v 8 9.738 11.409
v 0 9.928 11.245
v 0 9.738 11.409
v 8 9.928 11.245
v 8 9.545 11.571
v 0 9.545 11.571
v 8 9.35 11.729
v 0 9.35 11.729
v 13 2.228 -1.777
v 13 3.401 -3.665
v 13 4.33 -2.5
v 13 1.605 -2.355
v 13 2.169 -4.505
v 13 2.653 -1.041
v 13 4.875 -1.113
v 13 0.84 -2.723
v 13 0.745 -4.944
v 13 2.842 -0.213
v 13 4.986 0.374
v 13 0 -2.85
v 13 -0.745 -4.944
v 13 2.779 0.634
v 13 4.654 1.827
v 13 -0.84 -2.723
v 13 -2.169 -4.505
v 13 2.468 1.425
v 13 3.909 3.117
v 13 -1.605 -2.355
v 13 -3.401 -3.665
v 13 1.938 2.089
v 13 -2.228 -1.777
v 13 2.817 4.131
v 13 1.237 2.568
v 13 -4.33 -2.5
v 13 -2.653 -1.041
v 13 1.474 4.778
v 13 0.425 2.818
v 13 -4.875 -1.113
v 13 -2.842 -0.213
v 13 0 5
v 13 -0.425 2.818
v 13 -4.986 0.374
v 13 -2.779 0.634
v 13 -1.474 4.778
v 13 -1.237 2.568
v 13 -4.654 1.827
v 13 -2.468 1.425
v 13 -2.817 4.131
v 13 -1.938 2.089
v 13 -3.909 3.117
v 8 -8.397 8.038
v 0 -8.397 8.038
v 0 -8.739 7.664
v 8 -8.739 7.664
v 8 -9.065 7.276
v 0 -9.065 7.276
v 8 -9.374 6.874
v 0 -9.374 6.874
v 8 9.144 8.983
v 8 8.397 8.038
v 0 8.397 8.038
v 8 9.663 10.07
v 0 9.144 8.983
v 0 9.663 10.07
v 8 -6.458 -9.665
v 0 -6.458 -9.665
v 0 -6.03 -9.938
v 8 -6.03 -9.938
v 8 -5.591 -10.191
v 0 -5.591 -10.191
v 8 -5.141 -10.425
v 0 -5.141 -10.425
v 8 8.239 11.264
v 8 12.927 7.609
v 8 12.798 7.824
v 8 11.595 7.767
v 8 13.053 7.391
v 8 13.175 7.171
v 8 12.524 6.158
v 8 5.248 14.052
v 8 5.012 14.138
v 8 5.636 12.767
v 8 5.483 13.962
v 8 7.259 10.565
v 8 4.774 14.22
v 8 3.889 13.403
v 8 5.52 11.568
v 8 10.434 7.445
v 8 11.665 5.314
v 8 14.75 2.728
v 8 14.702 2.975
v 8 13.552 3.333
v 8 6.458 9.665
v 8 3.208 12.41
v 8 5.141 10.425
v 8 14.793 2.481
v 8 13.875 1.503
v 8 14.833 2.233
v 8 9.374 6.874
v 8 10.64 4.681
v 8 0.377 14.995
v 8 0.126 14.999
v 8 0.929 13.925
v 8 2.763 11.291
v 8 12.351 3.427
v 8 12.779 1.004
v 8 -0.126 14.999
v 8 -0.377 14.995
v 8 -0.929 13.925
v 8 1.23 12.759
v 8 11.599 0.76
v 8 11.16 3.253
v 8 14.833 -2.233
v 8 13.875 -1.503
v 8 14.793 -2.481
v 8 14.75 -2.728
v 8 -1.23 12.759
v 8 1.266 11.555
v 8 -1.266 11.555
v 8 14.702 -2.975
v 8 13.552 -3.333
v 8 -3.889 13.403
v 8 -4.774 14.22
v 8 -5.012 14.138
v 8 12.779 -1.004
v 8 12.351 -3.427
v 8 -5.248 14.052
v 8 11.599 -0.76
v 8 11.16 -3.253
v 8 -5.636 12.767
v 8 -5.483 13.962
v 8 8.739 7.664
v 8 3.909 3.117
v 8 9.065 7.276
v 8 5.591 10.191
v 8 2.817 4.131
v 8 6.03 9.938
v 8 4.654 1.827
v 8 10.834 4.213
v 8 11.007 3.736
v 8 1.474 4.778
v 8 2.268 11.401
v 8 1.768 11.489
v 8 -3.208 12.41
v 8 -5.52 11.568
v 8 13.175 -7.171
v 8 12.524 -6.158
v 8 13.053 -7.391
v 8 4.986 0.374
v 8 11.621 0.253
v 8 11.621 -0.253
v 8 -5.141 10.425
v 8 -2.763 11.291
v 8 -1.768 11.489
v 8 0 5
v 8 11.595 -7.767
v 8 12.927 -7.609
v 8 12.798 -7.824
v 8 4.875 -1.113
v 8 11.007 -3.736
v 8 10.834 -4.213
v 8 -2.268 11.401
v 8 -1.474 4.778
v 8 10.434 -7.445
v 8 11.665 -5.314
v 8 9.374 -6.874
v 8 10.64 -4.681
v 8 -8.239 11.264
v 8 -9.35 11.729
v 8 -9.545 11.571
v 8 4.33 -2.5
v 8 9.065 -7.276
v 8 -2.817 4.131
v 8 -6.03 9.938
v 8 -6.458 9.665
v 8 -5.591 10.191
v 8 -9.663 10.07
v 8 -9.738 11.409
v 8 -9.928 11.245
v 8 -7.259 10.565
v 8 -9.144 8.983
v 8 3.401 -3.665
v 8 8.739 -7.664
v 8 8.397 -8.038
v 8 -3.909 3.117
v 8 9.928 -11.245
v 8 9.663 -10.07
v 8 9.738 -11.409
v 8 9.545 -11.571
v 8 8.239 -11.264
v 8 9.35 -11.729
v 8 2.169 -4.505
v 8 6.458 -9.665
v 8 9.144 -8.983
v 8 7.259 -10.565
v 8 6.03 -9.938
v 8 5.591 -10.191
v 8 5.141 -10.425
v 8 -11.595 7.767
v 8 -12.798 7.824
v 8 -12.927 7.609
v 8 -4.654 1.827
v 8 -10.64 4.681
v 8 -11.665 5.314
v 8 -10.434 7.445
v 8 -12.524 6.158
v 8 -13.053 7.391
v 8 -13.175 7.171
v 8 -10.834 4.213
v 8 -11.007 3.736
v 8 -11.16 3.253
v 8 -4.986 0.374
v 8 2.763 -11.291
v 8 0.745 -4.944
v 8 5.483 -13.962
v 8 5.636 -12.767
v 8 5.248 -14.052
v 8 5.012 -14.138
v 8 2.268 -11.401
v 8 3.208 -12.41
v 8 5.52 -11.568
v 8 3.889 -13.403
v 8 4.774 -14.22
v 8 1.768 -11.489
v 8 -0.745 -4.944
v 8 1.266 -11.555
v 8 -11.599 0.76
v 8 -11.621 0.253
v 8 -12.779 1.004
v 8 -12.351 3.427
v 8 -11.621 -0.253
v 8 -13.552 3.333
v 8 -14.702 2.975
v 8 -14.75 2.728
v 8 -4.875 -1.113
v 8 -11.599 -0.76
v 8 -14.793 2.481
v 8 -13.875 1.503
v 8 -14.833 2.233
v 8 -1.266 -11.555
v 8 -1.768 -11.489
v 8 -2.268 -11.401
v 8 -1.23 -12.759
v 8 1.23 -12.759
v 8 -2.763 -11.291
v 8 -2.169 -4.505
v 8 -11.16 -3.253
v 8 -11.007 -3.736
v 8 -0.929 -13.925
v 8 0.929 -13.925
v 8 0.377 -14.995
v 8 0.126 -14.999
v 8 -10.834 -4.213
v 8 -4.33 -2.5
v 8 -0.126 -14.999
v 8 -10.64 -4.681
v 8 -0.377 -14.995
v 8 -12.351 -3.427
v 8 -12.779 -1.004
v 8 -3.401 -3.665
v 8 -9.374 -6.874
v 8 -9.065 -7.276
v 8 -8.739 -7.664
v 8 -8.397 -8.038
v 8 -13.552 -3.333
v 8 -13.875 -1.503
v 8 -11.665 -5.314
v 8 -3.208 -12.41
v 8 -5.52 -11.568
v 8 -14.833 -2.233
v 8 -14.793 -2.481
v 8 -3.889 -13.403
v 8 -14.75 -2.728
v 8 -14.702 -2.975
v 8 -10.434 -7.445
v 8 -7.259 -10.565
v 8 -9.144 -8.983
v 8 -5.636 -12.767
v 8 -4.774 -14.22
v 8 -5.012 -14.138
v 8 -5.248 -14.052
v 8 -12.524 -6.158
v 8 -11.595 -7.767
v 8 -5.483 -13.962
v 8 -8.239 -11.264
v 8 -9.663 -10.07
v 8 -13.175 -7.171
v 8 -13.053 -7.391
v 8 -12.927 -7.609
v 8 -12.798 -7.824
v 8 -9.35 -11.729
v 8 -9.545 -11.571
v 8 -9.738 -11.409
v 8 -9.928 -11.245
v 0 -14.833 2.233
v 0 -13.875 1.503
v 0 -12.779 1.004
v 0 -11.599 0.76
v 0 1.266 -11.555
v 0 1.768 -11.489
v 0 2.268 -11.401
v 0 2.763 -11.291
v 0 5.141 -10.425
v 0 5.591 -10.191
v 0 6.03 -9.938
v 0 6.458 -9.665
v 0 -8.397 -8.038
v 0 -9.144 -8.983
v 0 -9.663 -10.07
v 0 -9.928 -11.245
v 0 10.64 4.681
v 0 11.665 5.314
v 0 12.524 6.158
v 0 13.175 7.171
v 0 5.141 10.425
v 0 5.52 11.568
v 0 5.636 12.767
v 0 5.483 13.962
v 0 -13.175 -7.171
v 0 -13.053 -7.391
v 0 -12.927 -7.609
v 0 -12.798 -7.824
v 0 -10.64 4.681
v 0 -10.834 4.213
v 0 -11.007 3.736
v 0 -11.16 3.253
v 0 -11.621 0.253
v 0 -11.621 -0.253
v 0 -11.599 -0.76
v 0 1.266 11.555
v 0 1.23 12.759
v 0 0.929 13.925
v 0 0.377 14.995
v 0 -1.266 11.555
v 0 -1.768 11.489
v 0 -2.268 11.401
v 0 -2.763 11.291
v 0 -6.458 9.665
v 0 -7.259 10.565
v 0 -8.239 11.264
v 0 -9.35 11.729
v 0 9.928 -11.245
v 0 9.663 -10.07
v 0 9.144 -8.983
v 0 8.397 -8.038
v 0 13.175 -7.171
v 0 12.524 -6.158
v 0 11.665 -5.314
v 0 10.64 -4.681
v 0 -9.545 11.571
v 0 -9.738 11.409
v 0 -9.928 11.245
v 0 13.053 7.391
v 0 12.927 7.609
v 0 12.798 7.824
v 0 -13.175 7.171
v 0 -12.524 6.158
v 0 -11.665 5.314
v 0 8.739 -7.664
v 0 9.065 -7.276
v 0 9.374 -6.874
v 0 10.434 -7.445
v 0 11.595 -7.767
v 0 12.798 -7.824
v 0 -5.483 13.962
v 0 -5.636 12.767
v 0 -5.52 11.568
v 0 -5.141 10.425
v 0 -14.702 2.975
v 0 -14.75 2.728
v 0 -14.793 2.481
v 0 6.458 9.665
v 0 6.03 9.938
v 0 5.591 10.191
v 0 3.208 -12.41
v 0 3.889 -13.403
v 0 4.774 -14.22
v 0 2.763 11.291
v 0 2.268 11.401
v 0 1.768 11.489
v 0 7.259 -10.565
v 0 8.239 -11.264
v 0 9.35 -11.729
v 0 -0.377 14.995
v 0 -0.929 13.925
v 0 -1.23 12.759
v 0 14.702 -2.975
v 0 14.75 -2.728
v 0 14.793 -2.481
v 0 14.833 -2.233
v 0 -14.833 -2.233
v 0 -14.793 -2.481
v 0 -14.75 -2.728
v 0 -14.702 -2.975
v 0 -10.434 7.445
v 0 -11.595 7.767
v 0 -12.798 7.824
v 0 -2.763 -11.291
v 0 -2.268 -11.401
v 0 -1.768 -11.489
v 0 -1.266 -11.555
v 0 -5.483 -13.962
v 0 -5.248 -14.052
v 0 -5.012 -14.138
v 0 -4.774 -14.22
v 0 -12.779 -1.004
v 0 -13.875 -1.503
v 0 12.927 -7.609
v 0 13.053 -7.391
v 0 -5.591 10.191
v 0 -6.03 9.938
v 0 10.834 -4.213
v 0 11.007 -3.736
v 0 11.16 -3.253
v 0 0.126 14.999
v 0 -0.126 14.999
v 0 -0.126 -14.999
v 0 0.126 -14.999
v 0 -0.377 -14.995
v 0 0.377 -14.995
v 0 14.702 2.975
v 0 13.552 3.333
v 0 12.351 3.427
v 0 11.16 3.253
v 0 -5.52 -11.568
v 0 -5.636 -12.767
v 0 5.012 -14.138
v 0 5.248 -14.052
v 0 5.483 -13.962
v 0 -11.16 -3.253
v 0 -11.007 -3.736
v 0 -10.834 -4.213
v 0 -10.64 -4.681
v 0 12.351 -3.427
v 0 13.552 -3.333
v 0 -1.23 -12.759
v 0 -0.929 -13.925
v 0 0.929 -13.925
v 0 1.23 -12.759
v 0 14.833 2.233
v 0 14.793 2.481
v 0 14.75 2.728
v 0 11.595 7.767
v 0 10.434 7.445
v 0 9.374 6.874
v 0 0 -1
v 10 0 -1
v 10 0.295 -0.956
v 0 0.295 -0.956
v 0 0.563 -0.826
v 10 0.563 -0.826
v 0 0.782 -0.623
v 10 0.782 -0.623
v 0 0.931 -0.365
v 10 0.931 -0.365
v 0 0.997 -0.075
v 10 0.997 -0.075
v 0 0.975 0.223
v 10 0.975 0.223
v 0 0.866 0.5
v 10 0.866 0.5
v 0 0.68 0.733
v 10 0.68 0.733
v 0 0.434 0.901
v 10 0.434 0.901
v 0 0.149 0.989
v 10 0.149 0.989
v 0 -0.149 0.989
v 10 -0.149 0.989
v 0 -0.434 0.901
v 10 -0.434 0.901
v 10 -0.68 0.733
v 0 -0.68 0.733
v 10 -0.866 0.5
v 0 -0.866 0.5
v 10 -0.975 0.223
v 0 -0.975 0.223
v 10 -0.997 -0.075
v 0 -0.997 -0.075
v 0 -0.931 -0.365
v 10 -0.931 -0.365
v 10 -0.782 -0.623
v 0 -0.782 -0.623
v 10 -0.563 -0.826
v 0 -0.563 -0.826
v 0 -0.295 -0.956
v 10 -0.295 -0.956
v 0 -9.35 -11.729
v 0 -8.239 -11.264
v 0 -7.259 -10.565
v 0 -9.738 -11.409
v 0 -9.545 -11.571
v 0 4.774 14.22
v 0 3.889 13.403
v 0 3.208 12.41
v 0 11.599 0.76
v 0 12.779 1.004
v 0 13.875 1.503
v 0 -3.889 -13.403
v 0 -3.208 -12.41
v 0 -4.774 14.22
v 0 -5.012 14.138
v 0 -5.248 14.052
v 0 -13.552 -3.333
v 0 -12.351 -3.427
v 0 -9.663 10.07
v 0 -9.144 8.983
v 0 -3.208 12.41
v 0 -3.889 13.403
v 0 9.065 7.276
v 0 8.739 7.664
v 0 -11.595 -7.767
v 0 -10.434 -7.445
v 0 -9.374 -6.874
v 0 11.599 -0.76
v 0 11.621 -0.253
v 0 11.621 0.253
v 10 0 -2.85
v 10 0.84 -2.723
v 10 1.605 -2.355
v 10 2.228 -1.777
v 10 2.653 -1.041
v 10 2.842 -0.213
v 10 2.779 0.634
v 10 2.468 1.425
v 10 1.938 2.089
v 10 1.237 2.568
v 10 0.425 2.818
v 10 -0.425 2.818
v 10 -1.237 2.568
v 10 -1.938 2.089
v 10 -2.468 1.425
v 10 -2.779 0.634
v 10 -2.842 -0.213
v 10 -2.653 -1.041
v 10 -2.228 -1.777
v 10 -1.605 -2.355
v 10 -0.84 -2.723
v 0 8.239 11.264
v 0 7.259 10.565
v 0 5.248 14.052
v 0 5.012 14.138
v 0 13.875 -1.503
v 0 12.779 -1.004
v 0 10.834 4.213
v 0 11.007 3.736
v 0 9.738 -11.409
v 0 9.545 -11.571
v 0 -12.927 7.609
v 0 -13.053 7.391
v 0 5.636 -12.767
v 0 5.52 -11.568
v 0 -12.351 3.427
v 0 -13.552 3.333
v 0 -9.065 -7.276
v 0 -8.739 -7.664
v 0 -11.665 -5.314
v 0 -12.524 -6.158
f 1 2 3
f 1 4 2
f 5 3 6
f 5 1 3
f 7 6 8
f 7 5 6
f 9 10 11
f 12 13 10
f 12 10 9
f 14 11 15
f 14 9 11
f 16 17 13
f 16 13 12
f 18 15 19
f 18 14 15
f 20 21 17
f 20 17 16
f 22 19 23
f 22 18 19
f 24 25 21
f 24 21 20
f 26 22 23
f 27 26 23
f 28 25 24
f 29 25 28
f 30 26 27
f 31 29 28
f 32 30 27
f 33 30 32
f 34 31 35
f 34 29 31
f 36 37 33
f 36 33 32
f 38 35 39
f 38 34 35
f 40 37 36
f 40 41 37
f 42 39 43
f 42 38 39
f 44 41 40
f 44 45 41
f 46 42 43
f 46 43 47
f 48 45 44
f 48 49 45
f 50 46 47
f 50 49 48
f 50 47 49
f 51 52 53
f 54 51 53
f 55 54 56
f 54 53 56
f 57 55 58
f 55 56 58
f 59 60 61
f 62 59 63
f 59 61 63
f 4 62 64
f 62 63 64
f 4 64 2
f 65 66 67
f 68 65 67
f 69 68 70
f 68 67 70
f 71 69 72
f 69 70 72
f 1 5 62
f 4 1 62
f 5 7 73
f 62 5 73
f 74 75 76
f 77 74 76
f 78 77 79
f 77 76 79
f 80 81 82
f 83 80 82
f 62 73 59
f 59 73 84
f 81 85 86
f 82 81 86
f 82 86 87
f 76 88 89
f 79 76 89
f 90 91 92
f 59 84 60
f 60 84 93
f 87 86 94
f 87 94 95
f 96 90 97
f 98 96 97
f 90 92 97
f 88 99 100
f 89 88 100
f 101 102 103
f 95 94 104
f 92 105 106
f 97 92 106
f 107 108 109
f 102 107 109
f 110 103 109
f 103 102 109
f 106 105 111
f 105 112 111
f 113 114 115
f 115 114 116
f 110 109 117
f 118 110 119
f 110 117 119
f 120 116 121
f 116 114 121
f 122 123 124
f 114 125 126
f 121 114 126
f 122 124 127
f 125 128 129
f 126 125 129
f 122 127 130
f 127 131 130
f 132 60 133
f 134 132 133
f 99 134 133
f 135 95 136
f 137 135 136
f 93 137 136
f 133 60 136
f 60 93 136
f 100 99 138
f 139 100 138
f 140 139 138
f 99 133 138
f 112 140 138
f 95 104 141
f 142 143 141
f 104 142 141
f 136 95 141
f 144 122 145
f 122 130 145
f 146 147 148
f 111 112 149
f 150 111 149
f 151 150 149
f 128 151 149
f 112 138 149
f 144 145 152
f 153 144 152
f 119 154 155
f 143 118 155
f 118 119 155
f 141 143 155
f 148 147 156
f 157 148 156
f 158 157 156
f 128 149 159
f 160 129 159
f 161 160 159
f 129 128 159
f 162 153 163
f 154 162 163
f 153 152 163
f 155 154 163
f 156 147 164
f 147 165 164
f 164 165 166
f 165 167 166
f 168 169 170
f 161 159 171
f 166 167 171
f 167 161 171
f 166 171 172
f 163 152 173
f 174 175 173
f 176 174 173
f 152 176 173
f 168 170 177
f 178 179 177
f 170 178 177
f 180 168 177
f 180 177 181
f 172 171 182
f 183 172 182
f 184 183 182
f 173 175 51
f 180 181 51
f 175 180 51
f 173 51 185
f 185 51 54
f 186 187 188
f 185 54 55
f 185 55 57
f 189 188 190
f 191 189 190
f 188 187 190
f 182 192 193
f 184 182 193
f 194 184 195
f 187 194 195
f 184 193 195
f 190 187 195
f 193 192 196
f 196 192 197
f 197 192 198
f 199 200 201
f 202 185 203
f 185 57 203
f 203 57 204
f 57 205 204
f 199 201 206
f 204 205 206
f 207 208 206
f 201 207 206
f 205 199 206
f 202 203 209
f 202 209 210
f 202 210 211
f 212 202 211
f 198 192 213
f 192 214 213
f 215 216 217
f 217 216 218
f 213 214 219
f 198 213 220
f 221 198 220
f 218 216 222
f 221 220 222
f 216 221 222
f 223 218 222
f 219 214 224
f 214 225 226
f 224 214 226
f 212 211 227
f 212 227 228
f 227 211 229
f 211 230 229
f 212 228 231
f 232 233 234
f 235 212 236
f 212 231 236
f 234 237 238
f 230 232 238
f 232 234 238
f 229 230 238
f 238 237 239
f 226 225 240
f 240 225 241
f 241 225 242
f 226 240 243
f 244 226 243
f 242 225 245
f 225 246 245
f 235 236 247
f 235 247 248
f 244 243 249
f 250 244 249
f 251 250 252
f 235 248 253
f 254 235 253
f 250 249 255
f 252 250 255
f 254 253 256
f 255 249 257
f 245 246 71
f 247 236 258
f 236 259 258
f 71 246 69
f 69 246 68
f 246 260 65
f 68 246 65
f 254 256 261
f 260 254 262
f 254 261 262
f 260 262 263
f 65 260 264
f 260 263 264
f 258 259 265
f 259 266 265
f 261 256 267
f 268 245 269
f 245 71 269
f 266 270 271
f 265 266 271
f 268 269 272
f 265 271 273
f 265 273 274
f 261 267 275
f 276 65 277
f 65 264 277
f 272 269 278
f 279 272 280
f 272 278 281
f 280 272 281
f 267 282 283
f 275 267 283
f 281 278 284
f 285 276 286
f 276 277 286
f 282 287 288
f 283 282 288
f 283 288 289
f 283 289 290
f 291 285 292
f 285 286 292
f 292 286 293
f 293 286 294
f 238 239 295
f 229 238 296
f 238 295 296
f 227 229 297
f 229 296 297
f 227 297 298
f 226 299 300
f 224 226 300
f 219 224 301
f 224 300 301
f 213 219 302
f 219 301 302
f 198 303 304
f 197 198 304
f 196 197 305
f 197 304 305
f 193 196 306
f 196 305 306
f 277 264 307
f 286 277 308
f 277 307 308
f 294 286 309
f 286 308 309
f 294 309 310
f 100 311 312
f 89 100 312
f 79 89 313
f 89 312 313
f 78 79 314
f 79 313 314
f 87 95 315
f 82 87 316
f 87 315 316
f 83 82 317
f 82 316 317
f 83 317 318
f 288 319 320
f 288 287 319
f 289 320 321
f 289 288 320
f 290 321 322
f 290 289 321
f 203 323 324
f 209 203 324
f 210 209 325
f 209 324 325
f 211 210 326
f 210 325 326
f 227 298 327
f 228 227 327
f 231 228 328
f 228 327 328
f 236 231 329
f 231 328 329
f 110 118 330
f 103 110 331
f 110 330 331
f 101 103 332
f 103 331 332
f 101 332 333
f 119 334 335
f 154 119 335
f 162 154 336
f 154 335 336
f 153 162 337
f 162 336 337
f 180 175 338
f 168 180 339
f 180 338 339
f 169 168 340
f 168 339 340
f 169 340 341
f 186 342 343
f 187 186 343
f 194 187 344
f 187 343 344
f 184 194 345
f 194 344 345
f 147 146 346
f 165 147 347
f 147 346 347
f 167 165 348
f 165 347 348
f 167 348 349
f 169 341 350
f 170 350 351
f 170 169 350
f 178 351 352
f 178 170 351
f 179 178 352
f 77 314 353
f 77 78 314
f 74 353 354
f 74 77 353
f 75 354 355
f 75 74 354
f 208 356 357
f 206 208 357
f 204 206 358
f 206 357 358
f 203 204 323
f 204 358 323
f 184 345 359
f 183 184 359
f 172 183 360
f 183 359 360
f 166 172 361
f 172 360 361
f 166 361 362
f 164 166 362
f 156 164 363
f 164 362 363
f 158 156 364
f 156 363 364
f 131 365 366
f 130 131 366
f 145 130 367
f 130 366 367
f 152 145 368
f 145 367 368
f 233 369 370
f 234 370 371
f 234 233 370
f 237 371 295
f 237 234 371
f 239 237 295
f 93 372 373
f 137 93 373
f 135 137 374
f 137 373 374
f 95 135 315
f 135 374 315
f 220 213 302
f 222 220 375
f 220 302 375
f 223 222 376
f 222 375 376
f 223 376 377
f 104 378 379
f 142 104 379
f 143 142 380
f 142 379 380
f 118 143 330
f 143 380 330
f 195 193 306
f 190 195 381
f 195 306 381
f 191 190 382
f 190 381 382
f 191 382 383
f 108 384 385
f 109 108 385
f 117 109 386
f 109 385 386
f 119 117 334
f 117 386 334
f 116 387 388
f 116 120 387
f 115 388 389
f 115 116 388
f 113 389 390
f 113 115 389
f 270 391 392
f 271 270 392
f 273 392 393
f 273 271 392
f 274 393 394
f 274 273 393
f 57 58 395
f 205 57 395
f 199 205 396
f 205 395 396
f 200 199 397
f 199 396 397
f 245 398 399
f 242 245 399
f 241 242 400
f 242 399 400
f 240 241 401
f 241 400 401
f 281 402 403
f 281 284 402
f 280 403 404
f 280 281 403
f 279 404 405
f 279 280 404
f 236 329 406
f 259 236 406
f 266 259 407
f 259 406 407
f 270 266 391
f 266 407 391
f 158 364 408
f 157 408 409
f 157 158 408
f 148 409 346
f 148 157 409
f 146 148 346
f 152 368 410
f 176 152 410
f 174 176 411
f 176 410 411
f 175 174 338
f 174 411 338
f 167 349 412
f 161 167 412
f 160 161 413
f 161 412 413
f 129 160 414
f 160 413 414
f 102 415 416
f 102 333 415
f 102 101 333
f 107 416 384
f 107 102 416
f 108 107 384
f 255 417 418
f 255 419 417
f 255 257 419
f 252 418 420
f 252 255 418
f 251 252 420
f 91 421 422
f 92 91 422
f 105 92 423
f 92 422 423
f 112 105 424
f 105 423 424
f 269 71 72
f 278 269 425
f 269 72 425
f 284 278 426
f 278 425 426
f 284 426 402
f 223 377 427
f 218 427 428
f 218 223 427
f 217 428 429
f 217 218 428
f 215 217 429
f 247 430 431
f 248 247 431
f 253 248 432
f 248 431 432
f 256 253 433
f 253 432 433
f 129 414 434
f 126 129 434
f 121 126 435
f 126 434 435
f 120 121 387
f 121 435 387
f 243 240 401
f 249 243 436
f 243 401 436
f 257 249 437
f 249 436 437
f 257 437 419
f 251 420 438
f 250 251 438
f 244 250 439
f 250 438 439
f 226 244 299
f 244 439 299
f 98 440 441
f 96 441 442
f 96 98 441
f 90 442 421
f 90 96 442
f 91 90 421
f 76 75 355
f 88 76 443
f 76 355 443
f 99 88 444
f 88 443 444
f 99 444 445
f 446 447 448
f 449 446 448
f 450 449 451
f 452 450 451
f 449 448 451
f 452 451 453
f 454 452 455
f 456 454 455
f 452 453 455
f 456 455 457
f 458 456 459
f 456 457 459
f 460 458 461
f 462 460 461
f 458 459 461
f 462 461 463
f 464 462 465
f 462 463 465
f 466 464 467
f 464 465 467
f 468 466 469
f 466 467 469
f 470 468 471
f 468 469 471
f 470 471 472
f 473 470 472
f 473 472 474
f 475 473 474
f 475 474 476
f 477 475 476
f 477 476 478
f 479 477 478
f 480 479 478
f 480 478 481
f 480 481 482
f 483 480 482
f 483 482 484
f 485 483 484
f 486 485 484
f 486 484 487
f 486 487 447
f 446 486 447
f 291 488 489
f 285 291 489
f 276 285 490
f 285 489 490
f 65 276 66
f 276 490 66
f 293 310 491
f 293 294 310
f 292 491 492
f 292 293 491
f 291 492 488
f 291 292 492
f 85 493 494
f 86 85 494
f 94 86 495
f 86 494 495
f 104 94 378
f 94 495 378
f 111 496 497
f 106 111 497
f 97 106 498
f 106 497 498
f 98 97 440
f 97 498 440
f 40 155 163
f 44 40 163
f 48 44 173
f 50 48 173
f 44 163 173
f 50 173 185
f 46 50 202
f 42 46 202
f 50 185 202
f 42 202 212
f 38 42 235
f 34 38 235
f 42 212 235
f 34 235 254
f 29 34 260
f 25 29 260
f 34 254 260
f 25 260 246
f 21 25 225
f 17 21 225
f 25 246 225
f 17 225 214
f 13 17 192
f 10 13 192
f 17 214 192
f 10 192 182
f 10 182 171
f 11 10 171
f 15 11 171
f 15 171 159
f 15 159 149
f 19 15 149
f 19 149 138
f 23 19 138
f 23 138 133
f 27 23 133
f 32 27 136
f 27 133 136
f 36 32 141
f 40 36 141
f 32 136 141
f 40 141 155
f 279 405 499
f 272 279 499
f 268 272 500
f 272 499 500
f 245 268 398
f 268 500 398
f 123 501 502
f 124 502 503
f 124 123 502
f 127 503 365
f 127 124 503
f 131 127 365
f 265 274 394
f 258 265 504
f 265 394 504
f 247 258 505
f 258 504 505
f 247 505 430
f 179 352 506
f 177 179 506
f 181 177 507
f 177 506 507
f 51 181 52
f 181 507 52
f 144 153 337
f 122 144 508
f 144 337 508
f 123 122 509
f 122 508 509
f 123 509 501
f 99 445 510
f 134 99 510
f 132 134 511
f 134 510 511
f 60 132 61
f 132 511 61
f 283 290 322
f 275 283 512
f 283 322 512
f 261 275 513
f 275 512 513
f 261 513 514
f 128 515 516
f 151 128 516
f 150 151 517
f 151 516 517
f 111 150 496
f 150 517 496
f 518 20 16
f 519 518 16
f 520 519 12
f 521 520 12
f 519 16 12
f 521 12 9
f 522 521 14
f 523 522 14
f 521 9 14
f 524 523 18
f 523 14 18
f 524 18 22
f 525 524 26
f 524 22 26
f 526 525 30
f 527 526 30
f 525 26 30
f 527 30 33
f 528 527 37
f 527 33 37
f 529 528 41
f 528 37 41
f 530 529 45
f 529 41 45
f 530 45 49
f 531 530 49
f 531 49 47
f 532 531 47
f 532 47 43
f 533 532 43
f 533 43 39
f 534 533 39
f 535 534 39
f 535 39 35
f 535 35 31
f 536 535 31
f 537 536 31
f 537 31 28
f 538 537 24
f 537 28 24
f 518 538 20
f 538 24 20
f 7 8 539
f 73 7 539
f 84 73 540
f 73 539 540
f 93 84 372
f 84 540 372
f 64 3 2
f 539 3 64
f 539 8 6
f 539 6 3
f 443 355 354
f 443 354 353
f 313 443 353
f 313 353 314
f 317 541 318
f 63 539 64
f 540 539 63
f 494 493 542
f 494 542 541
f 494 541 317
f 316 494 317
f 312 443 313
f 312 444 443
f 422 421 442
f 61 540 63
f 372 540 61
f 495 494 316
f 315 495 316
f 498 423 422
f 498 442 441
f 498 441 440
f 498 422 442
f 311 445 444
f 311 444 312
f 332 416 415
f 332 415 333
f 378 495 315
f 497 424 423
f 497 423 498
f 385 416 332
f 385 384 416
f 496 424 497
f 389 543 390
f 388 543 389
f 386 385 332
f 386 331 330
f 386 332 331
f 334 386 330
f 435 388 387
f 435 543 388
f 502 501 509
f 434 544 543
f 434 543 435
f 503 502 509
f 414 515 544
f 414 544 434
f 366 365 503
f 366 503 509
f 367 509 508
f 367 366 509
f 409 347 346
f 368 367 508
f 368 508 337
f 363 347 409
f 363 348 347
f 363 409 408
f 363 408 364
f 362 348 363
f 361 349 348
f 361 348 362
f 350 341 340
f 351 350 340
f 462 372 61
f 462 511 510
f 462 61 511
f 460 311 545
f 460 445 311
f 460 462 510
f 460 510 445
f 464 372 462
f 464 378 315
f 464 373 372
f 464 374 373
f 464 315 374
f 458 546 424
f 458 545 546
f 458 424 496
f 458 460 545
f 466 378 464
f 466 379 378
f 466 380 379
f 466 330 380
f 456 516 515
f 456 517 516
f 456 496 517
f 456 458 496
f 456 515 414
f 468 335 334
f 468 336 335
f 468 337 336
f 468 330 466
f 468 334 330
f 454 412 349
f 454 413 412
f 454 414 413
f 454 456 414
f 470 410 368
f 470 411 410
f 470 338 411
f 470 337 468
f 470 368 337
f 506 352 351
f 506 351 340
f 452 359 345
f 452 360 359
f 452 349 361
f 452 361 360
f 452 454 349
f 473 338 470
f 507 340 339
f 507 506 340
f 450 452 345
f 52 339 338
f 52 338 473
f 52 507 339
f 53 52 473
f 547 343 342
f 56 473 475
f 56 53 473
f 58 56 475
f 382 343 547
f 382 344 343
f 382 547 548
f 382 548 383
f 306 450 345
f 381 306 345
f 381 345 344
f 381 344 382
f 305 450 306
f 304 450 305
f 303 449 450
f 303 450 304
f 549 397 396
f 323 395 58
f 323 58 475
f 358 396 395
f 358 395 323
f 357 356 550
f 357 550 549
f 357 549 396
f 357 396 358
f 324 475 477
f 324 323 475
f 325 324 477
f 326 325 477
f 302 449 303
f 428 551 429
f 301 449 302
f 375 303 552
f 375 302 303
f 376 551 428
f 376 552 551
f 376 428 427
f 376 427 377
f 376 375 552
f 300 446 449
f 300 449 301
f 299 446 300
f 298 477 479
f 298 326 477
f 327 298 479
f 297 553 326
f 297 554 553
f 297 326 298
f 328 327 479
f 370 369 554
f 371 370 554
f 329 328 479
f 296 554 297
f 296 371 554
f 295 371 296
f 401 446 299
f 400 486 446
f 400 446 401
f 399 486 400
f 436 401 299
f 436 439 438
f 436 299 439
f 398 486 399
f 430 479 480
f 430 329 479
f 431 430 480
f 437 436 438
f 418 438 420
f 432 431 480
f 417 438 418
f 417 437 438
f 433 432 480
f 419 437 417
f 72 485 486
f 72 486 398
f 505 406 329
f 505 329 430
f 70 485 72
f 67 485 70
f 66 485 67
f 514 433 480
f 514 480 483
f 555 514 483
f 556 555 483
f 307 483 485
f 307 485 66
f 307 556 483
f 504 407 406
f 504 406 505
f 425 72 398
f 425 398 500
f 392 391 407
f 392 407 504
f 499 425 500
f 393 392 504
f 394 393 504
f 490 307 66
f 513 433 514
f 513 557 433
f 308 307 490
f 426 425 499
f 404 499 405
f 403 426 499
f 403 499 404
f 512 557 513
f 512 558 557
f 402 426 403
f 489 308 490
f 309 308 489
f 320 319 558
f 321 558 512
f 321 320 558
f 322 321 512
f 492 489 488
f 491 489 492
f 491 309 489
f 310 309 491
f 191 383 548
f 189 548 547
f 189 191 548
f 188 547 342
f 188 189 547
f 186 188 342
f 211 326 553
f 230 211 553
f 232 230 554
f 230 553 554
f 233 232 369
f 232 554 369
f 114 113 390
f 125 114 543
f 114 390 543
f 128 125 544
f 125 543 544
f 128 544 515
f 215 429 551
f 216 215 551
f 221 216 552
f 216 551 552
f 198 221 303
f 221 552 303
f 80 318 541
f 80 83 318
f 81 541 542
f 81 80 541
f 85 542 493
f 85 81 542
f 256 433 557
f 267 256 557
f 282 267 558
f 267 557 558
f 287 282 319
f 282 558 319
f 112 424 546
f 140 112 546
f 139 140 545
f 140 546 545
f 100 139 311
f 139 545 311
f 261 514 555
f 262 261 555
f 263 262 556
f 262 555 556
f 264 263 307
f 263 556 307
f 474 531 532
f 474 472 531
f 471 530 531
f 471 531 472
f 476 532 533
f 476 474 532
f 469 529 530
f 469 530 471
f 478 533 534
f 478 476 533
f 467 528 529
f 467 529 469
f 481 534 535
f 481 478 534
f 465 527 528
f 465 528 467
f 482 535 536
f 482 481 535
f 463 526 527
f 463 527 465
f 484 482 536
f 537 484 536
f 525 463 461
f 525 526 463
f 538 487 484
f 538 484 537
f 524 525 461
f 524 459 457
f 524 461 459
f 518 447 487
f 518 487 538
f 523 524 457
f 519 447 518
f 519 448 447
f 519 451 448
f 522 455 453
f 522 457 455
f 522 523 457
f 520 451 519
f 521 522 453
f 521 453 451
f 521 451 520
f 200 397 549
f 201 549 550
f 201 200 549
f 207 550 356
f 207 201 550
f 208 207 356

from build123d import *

# Parameters (mm, degrees)
BASPROSKE_W             = 8
BASPROSKE_H             = 15
TOOTHCUT_DEPTH          = 23.671568097
TEETHCUTS_COUNT         = 18
TEETHCUTS_ANGLE         = 340
BORSKE_R                = 0.4
BORE_DEPTH              = 50.0000508
ESQUISSE1_R             = 5
BOSS_EXTRU_1_DEPTH      = 5
ESQUISSE2_R             = 2.85
ENL_V_MAT_EXTRU_1_DEPTH = 3
ESQUISSE3_R             = 1
ENL_V_MAT_EXTRU_2_DEPTH = 24.345559985


with BuildPart() as part:
    # BasProSke → Base-Revolve (revolve)
    with BuildSketch(Plane(origin=(0, 0, 0), x_dir=(1, 0, 0), z_dir=(0, 1, 0)), mode=Mode.PRIVATE) as base_revolve_sk:
        with Locations((4, 7.5)):
            Rectangle(BASPROSKE_W, BASPROSKE_H)
    revolve(base_revolve_sk.sketch.rotate(Axis((-10, 0, 0), (1, 0, 0)), 180), axis=Axis((-10, 0, 0), (1, 0, 0)))

    # TooCutSke → ToothCut (cut, through all)
    with BuildSketch(Plane(origin=(0, 0, 0), x_dir=(0, 0, -1), z_dir=(1, 0, 0))):
        with BuildLine():
            ThreePointArc((0.759974923, 11.599129886), (0, 11.624), (-0.759974923, 11.599129886))
            ThreePointArc((-0.759974923, 11.599129886), (-1.229186471, 13.354767823), (-2.254227748, 14.855339189))
            ThreePointArc((-2.254227748, 14.855339189), (0, 15.0254), (2.254227748, 14.855339189))
            ThreePointArc((2.254227748, 14.855339189), (1.229186471, 13.354767823), (0.759974923, 11.599129886))
        make_face()
    toothcut = extrude(amount=TOOTHCUT_DEPTH, mode=Mode.SUBTRACT)

    # TeethCuts: ToothCut ×18 about axis
    teethcuts_axis = Axis((-10, 0, 0), (1, 0, 0))
    for i in range(1, TEETHCUTS_COUNT):
        add(toothcut.rotate(teethcuts_axis, i * TEETHCUTS_ANGLE / (TEETHCUTS_COUNT - 1)), mode=Mode.SUBTRACT)

    # BorSke → Bore (cut, symmetric)
    with BuildSketch(Plane(origin=(0, 0, 0), x_dir=(0, 0, -1), z_dir=(1, 0, 0))):
        with Locations(Location((0, 0, 0), (0, 0, 180))):
            Circle(BORSKE_R)
    extrude(amount=BORE_DEPTH, both=True, mode=Mode.SUBTRACT)

    # Esquisse1 → Boss.-Extru.1 (add)
    with BuildSketch(Plane(origin=(8, 0, 0), x_dir=(0, 0, -1), z_dir=(1, 0, 0))):
        with Locations(Location((0, 0, 0), (0, 0, 180))):
            Circle(ESQUISSE1_R)
    extrude(amount=BOSS_EXTRU_1_DEPTH)

    # Esquisse2 → Enlèv. mat.-Extru.1 (cut)
    with BuildSketch(Plane(origin=(13, 0, 0), x_dir=(0, 0, -1), z_dir=(1, 0, 0))):
        Circle(ESQUISSE2_R)
    extrude(amount=-ENL_V_MAT_EXTRU_1_DEPTH, mode=Mode.SUBTRACT)

    # Esquisse3 → Enlèv. mat.-Extru.2 (cut, through all)
    with BuildSketch(Plane(origin=(10, 0, 0), x_dir=(0, 0, -1), z_dir=(1, 0, 0))):
        Circle(ESQUISSE3_R)
    extrude(amount=-ENL_V_MAT_EXTRU_2_DEPTH, mode=Mode.SUBTRACT)


solid = part.part
